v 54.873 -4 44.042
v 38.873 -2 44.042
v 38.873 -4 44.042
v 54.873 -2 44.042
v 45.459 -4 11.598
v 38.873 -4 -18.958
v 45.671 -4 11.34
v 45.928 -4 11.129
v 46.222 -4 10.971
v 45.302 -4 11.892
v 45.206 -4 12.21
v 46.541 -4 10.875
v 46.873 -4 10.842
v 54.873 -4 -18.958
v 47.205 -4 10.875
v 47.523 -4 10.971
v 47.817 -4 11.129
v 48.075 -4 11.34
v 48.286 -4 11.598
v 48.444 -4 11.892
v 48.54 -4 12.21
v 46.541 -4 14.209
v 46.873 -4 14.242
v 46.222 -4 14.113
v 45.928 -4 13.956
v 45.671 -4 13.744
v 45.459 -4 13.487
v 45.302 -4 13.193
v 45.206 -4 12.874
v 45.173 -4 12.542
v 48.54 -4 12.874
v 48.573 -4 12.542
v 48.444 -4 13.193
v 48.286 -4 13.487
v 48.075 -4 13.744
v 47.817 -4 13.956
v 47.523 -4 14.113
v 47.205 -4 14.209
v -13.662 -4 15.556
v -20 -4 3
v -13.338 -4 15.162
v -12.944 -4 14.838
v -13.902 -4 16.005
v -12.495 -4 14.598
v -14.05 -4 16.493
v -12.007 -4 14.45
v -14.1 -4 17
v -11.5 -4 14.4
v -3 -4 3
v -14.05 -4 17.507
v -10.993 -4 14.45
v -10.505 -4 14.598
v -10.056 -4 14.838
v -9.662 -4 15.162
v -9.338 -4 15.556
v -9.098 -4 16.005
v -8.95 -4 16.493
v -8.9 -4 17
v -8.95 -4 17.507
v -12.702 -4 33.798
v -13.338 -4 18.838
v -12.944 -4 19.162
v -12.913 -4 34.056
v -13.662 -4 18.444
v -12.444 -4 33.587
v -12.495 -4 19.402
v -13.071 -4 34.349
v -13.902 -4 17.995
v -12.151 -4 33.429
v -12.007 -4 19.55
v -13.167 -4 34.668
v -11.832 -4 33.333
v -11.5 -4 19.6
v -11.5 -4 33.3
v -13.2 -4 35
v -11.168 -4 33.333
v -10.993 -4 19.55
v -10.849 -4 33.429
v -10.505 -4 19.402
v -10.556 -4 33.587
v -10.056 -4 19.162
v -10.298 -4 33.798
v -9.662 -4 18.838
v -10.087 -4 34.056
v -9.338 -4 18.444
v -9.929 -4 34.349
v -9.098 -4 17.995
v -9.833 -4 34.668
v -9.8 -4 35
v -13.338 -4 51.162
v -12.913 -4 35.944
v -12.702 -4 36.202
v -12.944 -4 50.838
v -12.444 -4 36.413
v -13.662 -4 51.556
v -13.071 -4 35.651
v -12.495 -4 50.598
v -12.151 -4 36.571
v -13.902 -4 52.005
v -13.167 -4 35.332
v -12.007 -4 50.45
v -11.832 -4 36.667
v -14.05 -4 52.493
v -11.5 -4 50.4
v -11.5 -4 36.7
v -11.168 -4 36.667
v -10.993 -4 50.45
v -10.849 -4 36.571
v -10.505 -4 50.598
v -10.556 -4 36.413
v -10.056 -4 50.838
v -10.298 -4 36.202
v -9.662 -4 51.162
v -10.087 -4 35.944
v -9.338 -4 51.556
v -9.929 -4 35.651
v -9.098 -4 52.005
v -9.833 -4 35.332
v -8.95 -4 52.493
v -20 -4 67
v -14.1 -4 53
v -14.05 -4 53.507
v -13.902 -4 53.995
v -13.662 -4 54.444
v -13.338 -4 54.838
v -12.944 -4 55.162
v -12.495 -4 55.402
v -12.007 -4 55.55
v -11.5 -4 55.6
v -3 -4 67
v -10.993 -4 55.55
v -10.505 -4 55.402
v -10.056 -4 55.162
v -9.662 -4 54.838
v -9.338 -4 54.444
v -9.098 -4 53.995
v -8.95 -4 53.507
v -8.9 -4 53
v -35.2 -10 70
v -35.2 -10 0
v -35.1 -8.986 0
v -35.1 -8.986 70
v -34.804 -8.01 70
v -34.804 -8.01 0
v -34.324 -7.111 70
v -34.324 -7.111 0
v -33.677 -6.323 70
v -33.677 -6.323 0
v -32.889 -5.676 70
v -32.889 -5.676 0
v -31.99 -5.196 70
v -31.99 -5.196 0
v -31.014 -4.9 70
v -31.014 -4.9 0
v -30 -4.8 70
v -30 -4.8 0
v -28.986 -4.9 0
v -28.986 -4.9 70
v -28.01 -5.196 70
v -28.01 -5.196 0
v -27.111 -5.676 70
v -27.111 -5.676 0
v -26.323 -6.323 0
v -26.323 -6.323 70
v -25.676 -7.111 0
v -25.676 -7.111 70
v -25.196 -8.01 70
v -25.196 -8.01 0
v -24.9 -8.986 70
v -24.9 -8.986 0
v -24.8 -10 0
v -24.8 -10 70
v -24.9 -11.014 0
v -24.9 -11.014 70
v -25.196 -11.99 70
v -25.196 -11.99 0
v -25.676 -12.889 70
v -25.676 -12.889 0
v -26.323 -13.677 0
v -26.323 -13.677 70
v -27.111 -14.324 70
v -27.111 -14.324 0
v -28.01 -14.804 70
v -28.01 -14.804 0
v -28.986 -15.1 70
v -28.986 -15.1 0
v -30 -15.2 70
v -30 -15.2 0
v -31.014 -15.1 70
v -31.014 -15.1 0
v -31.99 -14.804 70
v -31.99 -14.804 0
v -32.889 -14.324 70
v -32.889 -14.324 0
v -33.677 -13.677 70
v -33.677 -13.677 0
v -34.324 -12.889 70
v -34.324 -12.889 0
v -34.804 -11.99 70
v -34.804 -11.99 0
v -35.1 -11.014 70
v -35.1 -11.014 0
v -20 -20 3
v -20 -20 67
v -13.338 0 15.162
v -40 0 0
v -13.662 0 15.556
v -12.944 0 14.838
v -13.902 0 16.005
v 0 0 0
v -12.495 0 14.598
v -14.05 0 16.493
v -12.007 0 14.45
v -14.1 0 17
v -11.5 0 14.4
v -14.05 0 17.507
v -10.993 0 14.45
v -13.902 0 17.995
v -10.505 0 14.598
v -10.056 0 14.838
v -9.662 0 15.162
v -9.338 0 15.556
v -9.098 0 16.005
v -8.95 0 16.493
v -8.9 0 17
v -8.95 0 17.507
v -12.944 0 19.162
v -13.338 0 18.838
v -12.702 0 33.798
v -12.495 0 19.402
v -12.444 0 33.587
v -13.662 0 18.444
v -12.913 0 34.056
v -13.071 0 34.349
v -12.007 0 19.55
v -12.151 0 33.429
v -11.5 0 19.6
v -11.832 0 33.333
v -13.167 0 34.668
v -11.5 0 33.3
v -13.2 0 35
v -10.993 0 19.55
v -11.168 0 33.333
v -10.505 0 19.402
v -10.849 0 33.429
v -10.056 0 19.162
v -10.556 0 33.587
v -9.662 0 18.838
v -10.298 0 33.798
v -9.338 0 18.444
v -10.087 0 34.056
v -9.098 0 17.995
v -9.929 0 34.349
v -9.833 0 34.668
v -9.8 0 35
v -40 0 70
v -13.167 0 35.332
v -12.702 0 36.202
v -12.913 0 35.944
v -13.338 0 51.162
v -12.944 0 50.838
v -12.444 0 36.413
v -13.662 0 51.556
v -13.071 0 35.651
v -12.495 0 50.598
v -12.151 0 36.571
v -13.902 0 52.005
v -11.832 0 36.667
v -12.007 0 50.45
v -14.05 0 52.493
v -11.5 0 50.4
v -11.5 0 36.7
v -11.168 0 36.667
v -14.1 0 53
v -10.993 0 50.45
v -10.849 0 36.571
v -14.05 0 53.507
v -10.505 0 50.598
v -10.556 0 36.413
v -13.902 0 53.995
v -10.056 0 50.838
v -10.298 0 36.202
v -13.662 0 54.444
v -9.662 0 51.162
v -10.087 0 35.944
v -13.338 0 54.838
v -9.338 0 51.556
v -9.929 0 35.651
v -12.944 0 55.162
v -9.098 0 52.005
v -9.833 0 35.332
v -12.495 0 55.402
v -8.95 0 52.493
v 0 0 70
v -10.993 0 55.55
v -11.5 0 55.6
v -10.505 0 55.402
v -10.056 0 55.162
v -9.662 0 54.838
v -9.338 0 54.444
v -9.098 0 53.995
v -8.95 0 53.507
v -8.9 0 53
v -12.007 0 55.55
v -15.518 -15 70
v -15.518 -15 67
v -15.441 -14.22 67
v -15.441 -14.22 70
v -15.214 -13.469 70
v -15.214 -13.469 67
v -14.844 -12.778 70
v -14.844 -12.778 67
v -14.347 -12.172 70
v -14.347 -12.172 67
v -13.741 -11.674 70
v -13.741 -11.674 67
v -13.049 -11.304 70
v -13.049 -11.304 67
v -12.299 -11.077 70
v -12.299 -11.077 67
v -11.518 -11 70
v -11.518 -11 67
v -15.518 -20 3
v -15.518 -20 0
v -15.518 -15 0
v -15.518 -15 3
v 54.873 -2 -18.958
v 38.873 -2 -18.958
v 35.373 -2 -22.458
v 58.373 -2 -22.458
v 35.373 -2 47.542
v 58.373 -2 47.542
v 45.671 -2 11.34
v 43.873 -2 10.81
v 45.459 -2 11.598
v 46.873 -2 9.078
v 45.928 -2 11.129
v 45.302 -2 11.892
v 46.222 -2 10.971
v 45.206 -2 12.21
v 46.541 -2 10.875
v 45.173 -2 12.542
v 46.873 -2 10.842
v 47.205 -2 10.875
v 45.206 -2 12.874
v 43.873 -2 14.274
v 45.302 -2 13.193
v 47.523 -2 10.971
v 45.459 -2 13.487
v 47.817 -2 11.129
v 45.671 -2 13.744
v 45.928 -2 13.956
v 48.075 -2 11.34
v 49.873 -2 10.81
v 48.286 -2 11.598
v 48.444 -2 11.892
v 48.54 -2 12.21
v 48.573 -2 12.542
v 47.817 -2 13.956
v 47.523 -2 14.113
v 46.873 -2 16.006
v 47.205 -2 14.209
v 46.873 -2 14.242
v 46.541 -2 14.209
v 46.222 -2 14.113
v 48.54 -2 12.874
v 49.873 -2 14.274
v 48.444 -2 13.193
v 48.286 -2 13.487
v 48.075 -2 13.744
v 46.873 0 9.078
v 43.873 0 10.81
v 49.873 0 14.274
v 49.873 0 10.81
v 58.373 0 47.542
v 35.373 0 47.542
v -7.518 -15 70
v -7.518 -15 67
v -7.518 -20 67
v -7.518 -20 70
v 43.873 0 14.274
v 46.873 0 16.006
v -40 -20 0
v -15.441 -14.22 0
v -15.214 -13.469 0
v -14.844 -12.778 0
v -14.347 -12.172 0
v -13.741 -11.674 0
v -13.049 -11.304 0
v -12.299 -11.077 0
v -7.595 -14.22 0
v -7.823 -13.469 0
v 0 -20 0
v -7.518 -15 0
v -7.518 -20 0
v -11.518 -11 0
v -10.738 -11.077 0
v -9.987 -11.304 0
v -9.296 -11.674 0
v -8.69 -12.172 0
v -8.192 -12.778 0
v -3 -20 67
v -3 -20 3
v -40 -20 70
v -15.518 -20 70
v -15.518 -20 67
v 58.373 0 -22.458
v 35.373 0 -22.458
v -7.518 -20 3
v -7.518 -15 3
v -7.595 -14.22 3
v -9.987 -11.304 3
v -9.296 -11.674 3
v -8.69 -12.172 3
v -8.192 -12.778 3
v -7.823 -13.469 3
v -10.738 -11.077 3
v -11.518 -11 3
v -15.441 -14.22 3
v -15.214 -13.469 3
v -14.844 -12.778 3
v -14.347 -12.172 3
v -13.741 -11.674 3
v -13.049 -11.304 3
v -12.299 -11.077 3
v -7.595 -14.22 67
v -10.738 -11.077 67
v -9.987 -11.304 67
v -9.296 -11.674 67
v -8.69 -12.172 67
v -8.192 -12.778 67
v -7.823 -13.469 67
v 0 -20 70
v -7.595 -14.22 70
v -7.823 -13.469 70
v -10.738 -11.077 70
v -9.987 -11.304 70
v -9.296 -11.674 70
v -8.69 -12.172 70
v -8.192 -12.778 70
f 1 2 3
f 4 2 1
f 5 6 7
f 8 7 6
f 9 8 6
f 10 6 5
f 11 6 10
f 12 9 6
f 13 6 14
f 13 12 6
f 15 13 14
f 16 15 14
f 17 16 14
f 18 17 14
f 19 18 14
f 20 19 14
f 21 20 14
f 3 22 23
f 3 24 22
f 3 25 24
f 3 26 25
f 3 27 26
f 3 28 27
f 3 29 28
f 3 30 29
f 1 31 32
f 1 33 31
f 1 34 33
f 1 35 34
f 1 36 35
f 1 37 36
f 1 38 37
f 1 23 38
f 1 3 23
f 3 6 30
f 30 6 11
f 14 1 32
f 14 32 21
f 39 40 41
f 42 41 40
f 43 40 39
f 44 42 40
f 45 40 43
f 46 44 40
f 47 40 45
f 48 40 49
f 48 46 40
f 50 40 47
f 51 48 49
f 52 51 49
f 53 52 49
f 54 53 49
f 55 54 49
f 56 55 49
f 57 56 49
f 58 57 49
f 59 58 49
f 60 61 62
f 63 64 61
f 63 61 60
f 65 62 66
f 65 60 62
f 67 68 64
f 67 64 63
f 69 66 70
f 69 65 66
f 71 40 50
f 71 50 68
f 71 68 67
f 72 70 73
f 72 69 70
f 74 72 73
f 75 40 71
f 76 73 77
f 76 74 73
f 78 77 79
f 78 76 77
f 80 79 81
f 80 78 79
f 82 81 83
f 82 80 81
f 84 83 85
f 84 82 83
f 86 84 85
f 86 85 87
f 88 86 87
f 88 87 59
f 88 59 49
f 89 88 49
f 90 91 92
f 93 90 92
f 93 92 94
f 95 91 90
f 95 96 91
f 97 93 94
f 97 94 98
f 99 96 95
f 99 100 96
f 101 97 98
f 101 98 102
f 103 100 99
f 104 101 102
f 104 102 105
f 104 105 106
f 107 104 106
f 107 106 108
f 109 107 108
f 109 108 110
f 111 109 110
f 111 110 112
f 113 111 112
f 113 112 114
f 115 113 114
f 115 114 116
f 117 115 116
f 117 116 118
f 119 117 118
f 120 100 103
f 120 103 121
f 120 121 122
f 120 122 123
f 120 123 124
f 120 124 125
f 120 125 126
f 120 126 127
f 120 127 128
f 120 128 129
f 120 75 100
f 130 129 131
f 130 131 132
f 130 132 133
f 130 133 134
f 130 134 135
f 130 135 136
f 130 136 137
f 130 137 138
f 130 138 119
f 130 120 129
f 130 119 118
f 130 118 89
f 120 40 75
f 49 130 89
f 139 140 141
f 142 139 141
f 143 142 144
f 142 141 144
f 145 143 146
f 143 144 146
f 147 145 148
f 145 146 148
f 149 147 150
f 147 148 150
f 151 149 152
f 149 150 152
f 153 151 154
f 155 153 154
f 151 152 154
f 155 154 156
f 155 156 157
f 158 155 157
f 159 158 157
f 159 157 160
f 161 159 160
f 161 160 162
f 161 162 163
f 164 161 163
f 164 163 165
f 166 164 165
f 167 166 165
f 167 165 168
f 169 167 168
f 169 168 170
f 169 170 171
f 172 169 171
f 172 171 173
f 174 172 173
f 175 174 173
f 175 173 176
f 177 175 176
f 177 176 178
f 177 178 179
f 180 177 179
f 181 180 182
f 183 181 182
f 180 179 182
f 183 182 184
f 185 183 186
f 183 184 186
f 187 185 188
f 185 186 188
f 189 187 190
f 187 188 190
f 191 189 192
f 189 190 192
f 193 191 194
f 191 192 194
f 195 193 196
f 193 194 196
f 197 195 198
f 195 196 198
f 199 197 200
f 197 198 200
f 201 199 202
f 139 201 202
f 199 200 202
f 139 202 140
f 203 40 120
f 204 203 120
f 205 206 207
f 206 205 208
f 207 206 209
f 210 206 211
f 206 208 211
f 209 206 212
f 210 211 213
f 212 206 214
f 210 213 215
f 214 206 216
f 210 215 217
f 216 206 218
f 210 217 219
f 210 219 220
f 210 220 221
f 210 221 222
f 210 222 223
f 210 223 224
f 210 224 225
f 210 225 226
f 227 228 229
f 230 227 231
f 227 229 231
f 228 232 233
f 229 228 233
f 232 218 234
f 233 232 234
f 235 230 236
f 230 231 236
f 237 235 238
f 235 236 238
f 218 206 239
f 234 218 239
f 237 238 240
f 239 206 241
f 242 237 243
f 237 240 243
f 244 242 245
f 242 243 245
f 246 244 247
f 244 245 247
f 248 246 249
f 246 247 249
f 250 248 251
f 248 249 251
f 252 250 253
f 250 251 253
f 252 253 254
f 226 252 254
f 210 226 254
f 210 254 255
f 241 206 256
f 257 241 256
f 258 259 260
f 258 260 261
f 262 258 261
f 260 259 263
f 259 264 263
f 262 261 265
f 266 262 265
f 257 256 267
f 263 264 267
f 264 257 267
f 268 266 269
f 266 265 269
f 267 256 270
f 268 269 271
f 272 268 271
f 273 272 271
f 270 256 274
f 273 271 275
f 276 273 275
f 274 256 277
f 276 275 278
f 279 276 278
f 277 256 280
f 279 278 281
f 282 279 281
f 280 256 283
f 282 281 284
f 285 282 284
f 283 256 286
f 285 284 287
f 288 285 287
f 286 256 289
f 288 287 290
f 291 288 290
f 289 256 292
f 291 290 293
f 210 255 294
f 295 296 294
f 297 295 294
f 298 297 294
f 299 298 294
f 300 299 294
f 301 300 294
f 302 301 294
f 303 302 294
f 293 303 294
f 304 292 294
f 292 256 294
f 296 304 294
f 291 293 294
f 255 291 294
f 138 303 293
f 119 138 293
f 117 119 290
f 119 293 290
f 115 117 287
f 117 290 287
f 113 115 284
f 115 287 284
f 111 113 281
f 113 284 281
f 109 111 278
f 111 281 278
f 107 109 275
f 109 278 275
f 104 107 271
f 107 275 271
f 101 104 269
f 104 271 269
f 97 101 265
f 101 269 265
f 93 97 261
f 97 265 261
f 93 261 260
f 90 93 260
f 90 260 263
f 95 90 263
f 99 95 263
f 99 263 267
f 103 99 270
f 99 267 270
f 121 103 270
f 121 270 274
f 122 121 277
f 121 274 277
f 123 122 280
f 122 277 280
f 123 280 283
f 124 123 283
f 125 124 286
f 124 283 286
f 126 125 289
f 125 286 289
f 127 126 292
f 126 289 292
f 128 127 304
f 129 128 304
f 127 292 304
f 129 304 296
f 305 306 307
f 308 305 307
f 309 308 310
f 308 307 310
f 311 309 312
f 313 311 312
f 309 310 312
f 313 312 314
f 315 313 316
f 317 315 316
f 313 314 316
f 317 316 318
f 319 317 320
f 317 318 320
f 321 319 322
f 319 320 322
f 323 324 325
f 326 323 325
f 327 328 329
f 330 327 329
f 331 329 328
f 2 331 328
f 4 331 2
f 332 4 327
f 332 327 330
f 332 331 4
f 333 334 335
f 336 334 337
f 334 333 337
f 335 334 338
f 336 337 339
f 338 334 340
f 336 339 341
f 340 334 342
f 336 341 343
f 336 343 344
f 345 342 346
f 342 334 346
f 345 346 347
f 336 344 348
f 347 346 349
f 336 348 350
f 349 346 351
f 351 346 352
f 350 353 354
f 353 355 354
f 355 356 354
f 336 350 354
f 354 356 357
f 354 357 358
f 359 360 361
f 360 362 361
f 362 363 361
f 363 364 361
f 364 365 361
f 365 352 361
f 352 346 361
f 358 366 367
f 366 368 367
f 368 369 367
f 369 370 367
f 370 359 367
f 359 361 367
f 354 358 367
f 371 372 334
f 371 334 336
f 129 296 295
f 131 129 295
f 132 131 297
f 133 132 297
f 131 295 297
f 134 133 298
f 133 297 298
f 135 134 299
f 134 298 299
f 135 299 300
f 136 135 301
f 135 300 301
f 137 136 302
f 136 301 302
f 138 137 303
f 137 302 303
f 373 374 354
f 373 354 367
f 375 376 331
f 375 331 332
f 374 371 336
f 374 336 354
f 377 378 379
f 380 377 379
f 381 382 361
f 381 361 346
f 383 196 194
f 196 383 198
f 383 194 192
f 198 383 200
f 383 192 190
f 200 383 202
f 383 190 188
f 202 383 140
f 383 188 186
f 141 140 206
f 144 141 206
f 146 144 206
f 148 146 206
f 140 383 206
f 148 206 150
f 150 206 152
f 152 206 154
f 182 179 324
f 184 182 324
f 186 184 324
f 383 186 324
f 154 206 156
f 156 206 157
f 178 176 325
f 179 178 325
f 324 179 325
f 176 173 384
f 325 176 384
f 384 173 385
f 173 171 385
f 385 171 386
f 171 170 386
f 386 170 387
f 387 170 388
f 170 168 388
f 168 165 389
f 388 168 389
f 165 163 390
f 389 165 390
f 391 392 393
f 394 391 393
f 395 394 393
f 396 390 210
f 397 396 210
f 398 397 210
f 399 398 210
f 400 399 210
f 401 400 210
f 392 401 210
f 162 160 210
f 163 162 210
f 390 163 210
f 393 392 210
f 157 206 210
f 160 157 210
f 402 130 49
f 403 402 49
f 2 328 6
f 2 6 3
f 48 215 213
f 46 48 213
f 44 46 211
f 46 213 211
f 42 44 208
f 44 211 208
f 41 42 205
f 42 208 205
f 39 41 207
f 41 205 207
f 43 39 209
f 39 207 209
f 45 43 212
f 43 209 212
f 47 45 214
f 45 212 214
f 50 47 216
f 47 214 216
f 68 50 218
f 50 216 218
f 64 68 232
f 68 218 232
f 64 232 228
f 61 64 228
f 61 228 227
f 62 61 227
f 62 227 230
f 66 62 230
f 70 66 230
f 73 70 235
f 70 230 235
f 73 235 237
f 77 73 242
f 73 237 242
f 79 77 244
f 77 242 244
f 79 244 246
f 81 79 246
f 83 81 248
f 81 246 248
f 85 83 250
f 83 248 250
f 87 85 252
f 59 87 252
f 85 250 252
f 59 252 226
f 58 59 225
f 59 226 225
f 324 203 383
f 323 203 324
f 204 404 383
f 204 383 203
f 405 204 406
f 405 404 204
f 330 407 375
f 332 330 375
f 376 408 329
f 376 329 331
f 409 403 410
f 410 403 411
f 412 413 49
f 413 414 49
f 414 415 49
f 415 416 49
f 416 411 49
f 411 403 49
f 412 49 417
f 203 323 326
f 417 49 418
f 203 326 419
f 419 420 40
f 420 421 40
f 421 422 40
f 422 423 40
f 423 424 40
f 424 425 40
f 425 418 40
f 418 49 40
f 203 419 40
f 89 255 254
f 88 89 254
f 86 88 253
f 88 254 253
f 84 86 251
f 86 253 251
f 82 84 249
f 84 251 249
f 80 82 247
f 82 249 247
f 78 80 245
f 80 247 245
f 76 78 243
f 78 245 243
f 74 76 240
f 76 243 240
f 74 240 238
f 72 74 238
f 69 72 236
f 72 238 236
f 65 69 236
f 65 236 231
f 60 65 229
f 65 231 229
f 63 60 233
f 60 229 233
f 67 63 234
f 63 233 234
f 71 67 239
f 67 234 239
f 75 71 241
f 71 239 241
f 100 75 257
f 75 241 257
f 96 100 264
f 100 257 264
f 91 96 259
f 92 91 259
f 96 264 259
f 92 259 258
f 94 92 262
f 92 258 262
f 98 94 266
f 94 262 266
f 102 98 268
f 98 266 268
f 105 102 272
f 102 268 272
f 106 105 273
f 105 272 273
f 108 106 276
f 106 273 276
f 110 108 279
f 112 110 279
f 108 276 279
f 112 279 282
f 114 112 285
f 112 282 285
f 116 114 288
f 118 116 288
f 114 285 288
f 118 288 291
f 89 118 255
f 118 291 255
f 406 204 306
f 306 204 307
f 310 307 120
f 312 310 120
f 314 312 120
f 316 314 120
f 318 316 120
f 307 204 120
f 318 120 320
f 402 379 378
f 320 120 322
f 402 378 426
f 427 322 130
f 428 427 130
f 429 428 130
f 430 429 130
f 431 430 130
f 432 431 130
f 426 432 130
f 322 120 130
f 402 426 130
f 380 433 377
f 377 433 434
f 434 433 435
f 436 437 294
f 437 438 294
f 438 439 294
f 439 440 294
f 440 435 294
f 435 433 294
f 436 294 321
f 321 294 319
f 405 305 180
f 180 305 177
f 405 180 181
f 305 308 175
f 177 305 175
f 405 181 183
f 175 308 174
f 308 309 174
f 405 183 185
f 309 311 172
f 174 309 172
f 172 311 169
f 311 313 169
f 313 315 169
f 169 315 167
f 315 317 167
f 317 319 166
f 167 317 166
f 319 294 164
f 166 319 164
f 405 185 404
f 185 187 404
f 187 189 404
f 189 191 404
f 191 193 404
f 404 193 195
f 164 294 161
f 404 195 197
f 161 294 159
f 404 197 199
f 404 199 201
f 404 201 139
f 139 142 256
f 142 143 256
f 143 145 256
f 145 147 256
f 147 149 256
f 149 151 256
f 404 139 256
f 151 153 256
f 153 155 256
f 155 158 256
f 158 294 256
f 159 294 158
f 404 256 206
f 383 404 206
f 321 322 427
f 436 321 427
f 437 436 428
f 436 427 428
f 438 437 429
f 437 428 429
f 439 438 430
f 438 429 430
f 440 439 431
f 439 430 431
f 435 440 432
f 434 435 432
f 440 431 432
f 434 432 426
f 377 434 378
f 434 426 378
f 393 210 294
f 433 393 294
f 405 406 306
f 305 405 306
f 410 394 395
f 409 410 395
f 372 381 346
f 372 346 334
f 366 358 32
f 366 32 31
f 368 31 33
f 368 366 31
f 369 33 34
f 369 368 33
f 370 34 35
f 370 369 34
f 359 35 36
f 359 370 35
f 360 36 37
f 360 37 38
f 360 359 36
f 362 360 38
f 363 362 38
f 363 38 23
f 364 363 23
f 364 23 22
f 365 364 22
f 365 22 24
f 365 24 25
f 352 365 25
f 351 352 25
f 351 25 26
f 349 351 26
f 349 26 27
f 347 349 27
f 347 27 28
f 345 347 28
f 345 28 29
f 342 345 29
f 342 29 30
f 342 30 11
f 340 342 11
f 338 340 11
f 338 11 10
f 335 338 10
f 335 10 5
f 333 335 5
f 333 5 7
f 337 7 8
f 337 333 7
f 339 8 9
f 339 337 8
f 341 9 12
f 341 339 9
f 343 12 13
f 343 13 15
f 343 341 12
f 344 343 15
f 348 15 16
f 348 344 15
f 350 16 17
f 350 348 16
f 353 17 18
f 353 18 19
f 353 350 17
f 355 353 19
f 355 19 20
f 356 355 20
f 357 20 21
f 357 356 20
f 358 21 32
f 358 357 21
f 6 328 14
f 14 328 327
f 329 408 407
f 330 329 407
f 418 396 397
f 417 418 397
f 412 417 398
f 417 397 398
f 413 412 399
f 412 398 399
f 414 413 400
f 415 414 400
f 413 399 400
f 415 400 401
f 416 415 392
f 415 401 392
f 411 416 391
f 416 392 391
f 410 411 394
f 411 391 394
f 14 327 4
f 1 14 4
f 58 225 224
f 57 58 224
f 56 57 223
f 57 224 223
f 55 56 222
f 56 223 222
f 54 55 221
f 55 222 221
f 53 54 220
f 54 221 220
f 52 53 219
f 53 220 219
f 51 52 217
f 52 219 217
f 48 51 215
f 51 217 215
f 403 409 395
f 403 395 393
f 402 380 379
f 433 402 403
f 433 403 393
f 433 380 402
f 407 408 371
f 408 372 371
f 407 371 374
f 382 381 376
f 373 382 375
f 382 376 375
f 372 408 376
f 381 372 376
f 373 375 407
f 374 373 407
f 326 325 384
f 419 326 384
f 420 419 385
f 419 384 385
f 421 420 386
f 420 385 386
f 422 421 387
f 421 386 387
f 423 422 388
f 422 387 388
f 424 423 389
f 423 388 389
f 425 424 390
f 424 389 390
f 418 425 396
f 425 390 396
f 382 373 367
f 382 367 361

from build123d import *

# Parameters (mm, degrees)
F1_DEPTH  = 20
F2_DEPTH  = 4
F4_DEPTH  = 80
F5_W      = 23
F5_H      = 70
F5_W_2    = 16
F5_H_2    = 63
F6_DEPTH  = 2
F7_DEPTH  = 4
F8_DEPTH  = 80
F5_R      = 1.7
F9_DEPTH  = 4
F10_DEPTH = 2


with BuildPart() as f1:
    # F0 (on Front) → F1 (new body)
    with BuildSketch(Plane.XZ):
        Polygon((-40, 0), (-20, 0), (-20, 3), (-20, 35), (-20, 67), (-20, 70), (-40, 70), align=None)
        Polygon((-20, 0), (0, 0), (0, 70), (-20, 70), (-20, 67), (-11.5, 67), (-3, 67), (-3, 35), (-3, 3), (-11.5, 3), (-20, 3), align=None)
    extrude(amount=F1_DEPTH)

    # F0 (on Front) → F2 (join)
    with BuildSketch(Plane.XZ):
        with BuildLine():
            Line((-20, 67), (-20, 35))
            Line((-20, 35), (-15, 35))
            ThreePointArc((-15, 35), (-11.5, 38.5), (-8, 35))
            Line((-8, 35), (-3, 35))
            Line((-3, 35), (-3, 67))
            Line((-3, 67), (-11.5, 67))
            Line((-11.5, 67), (-20, 67))
        make_face()
        with BuildLine():
            ThreePointArc((-8.9, 53), (-13.3384776311, 51.1615223689), (-11.5, 55.6))
            ThreePointArc((-11.5, 55.6), (-9.6615223689, 54.8384776311), (-8.9, 53))
        make_face(mode=Mode.SUBTRACT)
        with BuildLine():
            Line((-20, 35), (-20, 3))
            Line((-20, 3), (-11.5, 3))
            Line((-11.5, 3), (-3, 3))
            Line((-3, 3), (-3, 35))
            Line((-3, 35), (-8, 35))
            ThreePointArc((-8, 35), (-11.5, 31.5), (-15, 35))
            Line((-15, 35), (-20, 35))
        make_face()
        with BuildLine():
            ThreePointArc((-8.9, 17), (-9.6615223689, 15.1615223689), (-11.5, 14.4))
            ThreePointArc((-11.5, 14.4), (-13.3384776311, 18.8384776311), (-8.9, 17))
        make_face(mode=Mode.SUBTRACT)
        with BuildLine():
            ThreePointArc((-8, 35), (-11.5, 38.5), (-15, 35))
            Line((-15, 35), (-13.2, 35))
            ThreePointArc((-13.2, 35), (-11.5, 36.7), (-9.8, 35))
            Line((-9.8, 35), (-8, 35))
        make_face()
        with BuildLine():
            Line((-13.2, 35), (-15, 35))
            ThreePointArc((-15, 35), (-11.5, 31.5), (-8, 35))
            Line((-8, 35), (-9.8, 35))
            ThreePointArc((-9.8, 35), (-11.5, 33.3), (-13.2, 35))
        make_face()
    extrude(amount=F2_DEPTH)

    # F3 (on face) → F4 (cut)
    with BuildSketch(Plane(origin=(0, 0, 0), x_dir=(1, 0, 0), z_dir=(0, 0, -1))):
        with BuildLine():
            ThreePointArc((-15.5182241425, 15), (-14.3466512672, 12.1715728753), (-11.5182241425, 11))
            ThreePointArc((-11.5182241425, 11), (-8.6897970177, 12.1715728753), (-7.5182241425, 15))
            Line((-7.5182241425, 15), (-7.5182241425, 20))
            Line((-7.5182241425, 20), (-15.5182241425, 20))
            Line((-15.5182241425, 20), (-15.5182241425, 15))
        make_face()
    extrude(amount=-F4_DEPTH, mode=Mode.SUBTRACT)

    # F3 (on face) → F8 (cut)
    with BuildSketch(Plane(origin=(0, 0, 0), x_dir=(1, 0, 0), z_dir=(0, 0, -1))):
        with BuildLine():
            ThreePointArc((-24.8, 10), (-30, 15.2), (-35.2, 10))
            ThreePointArc((-35.2, 10), (-30, 4.8), (-24.8, 10))
        make_face()
    extrude(amount=-F8_DEPTH, mode=Mode.SUBTRACT)


with BuildPart() as f6:
    # F5 (on Front) → F6 (new body)
    with BuildSketch(Plane.XZ):
        with Locations((46.872921288, 12.5420667385)):
            Rectangle(F5_W, F5_H)
        with Locations((46.872921288, 12.5420667385)):
            Rectangle(F5_W_2, F5_H_2, mode=Mode.SUBTRACT)
    extrude(amount=F6_DEPTH)

    # F5 (on Front) → F7 (join)
    with BuildSketch(Plane.XZ):
        with Locations((46.872921288, 12.5420667385)):
            Rectangle(F5_W_2, F5_H_2)
        Polygon((46.872921288, 9.0779651234), (43.872921288, 10.810015931), (43.872921288, 14.2741175461), (46.872921288, 16.0061683537), (49.872921288, 14.2741175461), (49.872921288, 10.810015931), align=None, mode=Mode.SUBTRACT)
    extrude(amount=F7_DEPTH)

    # F5 (on Front) → F9 (join)
    with BuildSketch(Plane.XZ):
        Polygon((43.872921288, 14.2741175461), (43.872921288, 10.810015931), (46.872921288, 9.0779651234), (49.872921288, 10.810015931), (49.872921288, 14.2741175461), (46.872921288, 16.0061683537), align=None)
        with Locations((46.872921288, 12.5420667385)):
            Circle(F5_R, mode=Mode.SUBTRACT)
    extrude(amount=F9_DEPTH)

    # F5 (on Front) → F10 (cut)
    with BuildSketch(Plane.XZ):
        Polygon((43.872921288, 14.2741175461), (43.872921288, 10.810015931), (46.872921288, 9.0779651234), (49.872921288, 10.810015931), (49.872921288, 14.2741175461), (46.872921288, 16.0061683537), align=None)
        with Locations((46.872921288, 12.5420667385)):
            Circle(F5_R, mode=Mode.SUBTRACT)
    extrude(amount=F10_DEPTH, mode=Mode.SUBTRACT)


solid = Compound([f1.part, f6.part])
